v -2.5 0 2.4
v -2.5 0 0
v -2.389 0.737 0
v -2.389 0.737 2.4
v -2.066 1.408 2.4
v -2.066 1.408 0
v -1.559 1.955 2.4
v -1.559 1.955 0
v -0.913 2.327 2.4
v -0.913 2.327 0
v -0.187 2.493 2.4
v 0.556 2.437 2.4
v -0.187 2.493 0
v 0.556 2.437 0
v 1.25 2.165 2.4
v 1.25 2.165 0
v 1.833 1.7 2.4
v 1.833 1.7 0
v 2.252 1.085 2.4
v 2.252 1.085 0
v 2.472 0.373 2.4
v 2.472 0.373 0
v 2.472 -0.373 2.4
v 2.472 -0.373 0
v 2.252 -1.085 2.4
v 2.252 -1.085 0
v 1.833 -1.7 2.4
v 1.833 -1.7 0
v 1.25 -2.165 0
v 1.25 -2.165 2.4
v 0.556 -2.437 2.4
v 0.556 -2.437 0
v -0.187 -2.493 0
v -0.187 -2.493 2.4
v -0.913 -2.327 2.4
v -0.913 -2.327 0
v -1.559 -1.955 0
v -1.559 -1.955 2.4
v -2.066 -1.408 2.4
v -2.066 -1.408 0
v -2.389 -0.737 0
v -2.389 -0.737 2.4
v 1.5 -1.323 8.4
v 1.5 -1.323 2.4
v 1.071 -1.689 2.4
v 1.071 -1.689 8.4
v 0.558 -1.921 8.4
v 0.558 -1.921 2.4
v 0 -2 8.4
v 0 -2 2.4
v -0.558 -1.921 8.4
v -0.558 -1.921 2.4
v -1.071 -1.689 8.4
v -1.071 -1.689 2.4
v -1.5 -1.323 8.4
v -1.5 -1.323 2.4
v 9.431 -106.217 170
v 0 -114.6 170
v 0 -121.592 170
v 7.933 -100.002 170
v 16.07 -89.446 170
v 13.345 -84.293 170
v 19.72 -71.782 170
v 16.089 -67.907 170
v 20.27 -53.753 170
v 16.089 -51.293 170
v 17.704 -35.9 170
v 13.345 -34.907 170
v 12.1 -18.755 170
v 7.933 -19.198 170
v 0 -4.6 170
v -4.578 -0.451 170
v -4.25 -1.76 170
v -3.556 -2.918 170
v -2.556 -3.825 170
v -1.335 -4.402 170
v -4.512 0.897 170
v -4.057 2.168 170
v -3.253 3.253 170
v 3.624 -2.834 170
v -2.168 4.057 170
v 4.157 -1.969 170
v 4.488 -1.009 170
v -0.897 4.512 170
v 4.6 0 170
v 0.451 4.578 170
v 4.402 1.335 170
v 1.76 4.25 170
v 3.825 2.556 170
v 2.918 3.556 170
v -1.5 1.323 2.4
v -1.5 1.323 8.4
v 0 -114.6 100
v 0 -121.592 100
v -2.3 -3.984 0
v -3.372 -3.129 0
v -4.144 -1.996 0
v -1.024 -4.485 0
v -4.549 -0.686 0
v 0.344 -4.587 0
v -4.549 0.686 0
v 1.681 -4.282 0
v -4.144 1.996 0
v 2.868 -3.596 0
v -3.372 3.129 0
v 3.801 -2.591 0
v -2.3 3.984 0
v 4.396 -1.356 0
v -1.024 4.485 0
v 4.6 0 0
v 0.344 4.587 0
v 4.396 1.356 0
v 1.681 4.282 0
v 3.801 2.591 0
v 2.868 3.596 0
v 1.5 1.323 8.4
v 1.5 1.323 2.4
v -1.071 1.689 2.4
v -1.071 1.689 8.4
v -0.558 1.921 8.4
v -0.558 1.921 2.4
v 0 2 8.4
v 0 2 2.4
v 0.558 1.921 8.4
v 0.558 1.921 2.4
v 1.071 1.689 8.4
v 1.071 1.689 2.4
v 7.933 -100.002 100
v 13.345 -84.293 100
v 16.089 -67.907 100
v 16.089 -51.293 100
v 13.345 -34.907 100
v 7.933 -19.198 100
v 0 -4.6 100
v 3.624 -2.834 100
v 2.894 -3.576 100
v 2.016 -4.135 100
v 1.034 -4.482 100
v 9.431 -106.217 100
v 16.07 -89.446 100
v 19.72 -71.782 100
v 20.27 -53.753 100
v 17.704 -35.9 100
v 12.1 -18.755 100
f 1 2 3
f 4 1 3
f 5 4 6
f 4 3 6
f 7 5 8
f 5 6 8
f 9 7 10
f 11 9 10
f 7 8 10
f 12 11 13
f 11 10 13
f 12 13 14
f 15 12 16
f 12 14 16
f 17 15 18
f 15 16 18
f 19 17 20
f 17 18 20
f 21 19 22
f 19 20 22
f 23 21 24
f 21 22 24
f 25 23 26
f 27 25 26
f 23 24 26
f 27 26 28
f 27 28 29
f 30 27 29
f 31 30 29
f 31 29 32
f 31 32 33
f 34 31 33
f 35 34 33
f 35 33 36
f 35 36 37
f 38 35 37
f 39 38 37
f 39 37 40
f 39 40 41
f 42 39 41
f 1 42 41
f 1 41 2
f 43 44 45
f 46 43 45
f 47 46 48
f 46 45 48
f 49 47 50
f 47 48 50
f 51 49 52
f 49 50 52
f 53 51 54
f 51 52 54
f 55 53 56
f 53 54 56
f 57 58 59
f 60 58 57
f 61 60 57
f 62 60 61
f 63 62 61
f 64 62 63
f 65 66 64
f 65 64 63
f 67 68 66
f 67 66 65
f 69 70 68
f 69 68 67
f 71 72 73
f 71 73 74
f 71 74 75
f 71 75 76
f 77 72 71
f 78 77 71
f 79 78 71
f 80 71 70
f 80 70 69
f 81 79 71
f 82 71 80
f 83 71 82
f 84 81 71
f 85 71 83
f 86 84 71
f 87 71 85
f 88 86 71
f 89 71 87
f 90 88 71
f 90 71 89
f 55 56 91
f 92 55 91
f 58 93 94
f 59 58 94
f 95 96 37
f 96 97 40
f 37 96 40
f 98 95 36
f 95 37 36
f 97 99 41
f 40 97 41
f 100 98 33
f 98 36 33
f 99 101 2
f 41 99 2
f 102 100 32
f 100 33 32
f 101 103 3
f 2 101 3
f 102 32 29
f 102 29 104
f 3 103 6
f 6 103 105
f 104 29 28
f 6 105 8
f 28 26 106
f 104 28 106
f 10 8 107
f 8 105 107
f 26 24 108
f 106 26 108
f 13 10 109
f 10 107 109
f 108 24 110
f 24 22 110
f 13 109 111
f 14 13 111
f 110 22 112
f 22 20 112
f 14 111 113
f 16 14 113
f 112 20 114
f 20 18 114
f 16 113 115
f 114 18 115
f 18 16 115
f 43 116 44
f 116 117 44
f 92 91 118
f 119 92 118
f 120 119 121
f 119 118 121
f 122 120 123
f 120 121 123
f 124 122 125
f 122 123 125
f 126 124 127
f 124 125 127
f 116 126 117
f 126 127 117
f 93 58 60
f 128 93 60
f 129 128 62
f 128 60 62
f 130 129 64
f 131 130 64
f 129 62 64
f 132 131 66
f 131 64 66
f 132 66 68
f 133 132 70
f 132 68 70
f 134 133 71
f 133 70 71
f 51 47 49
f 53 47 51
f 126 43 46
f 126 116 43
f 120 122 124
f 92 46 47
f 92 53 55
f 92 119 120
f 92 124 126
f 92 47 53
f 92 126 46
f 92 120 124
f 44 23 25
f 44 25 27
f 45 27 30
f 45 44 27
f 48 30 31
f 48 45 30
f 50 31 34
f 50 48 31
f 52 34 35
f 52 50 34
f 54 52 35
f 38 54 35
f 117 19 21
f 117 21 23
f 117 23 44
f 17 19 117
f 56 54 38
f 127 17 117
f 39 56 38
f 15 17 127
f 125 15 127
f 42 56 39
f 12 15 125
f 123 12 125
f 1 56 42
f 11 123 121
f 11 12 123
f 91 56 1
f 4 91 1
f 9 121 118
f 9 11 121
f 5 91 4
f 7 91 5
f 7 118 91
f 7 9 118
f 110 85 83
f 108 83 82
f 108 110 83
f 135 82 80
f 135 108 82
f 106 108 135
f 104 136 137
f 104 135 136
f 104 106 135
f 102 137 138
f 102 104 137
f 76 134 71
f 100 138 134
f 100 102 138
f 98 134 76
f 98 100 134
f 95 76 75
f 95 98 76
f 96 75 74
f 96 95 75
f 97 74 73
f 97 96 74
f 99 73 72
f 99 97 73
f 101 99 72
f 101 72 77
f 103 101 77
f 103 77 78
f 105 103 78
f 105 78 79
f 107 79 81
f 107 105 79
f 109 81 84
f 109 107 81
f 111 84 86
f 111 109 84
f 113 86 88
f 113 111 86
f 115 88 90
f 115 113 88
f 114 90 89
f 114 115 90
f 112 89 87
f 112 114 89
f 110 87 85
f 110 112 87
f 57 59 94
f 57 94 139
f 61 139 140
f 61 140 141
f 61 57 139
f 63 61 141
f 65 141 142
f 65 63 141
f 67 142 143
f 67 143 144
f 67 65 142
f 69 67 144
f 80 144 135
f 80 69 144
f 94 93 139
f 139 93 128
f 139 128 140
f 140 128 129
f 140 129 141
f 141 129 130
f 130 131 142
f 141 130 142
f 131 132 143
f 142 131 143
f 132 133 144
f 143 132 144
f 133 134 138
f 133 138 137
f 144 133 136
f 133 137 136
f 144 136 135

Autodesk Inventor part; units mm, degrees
ref_plane "YZ Plane" through (0, 0, 0) normal (1, 0, 0) x (0, 1, 0)
ref_plane "XZ Plane" through (0, 0, 0) normal (0, 1, 0) x (-1, 0, 0)
ref_plane "XY Plane" through (0, 0, 0) normal (0, 0, 1) x (1, 0, 0)
sketch "Эскиз1" plane through (0, 0, 0) normal (0, 0, 1) x (1, 0, 0)
  circle A0 centre (0, 0) radius 4.6
  dimension "d0" = 9.2
extrude "Выдавливание1" add sketch "Эскиз1" along normal blind 170
sketch "Эскиз3" plane through (0, 0, 170) normal (0, 0, 1) x (1, 0, 0)
  circle A0 centre (0, 0) radius 4.6 projected
  arc A1 (0, -114.6) -> (0, -4.6) centre (-83.8186, -59.6) ccw
  arc A2 (0, -121.5921) -> (3.6237, -2.8336) centre (-83.8186, -59.6) ccw
  line L0 (0, 0) -> (0, -4.6) construction
  line L1 (0, -114.6) -> (0, -121.5921)
  dimension "d3" = 4
  dimension "d4" = 110
extrude "Выдавливание2" add sketch "Эскиз3" against normal blind 70 contours A0 A2 L1 A1
sketch "Эскиз5" plane through (0, 0, 0) normal (0, 0, -1) x (-1, 0, 0)
  line L0 (-1.5, 1.3229) -> (-1.5, -1.3229) projected
  arc A0 (1.5, 1.3229) -> (-1.5, 1.3229) centre (0, 0) ccw projected
  line L1 (1.5, -1.3229) -> (1.5, 1.3229) projected
  arc A1 (-1.5, -1.3229) -> (1.5, -1.3229) centre (0, 0) ccw projected
  point P0 (0, 0)
extrude "Выдавливание4" cut sketch "Эскиз5" against normal blind 8.4
sketch "Эскиз6" plane through (0, 0, 0) normal (0, 0, -1) x (-1, 0, 0)
  circle A0 centre (0, 0) radius 2.5 projected
  point P0 (0, 0)
extrude "Выдавливание5" cut sketch "Эскиз6" against normal blind 2.4
properties part number "локатор"
